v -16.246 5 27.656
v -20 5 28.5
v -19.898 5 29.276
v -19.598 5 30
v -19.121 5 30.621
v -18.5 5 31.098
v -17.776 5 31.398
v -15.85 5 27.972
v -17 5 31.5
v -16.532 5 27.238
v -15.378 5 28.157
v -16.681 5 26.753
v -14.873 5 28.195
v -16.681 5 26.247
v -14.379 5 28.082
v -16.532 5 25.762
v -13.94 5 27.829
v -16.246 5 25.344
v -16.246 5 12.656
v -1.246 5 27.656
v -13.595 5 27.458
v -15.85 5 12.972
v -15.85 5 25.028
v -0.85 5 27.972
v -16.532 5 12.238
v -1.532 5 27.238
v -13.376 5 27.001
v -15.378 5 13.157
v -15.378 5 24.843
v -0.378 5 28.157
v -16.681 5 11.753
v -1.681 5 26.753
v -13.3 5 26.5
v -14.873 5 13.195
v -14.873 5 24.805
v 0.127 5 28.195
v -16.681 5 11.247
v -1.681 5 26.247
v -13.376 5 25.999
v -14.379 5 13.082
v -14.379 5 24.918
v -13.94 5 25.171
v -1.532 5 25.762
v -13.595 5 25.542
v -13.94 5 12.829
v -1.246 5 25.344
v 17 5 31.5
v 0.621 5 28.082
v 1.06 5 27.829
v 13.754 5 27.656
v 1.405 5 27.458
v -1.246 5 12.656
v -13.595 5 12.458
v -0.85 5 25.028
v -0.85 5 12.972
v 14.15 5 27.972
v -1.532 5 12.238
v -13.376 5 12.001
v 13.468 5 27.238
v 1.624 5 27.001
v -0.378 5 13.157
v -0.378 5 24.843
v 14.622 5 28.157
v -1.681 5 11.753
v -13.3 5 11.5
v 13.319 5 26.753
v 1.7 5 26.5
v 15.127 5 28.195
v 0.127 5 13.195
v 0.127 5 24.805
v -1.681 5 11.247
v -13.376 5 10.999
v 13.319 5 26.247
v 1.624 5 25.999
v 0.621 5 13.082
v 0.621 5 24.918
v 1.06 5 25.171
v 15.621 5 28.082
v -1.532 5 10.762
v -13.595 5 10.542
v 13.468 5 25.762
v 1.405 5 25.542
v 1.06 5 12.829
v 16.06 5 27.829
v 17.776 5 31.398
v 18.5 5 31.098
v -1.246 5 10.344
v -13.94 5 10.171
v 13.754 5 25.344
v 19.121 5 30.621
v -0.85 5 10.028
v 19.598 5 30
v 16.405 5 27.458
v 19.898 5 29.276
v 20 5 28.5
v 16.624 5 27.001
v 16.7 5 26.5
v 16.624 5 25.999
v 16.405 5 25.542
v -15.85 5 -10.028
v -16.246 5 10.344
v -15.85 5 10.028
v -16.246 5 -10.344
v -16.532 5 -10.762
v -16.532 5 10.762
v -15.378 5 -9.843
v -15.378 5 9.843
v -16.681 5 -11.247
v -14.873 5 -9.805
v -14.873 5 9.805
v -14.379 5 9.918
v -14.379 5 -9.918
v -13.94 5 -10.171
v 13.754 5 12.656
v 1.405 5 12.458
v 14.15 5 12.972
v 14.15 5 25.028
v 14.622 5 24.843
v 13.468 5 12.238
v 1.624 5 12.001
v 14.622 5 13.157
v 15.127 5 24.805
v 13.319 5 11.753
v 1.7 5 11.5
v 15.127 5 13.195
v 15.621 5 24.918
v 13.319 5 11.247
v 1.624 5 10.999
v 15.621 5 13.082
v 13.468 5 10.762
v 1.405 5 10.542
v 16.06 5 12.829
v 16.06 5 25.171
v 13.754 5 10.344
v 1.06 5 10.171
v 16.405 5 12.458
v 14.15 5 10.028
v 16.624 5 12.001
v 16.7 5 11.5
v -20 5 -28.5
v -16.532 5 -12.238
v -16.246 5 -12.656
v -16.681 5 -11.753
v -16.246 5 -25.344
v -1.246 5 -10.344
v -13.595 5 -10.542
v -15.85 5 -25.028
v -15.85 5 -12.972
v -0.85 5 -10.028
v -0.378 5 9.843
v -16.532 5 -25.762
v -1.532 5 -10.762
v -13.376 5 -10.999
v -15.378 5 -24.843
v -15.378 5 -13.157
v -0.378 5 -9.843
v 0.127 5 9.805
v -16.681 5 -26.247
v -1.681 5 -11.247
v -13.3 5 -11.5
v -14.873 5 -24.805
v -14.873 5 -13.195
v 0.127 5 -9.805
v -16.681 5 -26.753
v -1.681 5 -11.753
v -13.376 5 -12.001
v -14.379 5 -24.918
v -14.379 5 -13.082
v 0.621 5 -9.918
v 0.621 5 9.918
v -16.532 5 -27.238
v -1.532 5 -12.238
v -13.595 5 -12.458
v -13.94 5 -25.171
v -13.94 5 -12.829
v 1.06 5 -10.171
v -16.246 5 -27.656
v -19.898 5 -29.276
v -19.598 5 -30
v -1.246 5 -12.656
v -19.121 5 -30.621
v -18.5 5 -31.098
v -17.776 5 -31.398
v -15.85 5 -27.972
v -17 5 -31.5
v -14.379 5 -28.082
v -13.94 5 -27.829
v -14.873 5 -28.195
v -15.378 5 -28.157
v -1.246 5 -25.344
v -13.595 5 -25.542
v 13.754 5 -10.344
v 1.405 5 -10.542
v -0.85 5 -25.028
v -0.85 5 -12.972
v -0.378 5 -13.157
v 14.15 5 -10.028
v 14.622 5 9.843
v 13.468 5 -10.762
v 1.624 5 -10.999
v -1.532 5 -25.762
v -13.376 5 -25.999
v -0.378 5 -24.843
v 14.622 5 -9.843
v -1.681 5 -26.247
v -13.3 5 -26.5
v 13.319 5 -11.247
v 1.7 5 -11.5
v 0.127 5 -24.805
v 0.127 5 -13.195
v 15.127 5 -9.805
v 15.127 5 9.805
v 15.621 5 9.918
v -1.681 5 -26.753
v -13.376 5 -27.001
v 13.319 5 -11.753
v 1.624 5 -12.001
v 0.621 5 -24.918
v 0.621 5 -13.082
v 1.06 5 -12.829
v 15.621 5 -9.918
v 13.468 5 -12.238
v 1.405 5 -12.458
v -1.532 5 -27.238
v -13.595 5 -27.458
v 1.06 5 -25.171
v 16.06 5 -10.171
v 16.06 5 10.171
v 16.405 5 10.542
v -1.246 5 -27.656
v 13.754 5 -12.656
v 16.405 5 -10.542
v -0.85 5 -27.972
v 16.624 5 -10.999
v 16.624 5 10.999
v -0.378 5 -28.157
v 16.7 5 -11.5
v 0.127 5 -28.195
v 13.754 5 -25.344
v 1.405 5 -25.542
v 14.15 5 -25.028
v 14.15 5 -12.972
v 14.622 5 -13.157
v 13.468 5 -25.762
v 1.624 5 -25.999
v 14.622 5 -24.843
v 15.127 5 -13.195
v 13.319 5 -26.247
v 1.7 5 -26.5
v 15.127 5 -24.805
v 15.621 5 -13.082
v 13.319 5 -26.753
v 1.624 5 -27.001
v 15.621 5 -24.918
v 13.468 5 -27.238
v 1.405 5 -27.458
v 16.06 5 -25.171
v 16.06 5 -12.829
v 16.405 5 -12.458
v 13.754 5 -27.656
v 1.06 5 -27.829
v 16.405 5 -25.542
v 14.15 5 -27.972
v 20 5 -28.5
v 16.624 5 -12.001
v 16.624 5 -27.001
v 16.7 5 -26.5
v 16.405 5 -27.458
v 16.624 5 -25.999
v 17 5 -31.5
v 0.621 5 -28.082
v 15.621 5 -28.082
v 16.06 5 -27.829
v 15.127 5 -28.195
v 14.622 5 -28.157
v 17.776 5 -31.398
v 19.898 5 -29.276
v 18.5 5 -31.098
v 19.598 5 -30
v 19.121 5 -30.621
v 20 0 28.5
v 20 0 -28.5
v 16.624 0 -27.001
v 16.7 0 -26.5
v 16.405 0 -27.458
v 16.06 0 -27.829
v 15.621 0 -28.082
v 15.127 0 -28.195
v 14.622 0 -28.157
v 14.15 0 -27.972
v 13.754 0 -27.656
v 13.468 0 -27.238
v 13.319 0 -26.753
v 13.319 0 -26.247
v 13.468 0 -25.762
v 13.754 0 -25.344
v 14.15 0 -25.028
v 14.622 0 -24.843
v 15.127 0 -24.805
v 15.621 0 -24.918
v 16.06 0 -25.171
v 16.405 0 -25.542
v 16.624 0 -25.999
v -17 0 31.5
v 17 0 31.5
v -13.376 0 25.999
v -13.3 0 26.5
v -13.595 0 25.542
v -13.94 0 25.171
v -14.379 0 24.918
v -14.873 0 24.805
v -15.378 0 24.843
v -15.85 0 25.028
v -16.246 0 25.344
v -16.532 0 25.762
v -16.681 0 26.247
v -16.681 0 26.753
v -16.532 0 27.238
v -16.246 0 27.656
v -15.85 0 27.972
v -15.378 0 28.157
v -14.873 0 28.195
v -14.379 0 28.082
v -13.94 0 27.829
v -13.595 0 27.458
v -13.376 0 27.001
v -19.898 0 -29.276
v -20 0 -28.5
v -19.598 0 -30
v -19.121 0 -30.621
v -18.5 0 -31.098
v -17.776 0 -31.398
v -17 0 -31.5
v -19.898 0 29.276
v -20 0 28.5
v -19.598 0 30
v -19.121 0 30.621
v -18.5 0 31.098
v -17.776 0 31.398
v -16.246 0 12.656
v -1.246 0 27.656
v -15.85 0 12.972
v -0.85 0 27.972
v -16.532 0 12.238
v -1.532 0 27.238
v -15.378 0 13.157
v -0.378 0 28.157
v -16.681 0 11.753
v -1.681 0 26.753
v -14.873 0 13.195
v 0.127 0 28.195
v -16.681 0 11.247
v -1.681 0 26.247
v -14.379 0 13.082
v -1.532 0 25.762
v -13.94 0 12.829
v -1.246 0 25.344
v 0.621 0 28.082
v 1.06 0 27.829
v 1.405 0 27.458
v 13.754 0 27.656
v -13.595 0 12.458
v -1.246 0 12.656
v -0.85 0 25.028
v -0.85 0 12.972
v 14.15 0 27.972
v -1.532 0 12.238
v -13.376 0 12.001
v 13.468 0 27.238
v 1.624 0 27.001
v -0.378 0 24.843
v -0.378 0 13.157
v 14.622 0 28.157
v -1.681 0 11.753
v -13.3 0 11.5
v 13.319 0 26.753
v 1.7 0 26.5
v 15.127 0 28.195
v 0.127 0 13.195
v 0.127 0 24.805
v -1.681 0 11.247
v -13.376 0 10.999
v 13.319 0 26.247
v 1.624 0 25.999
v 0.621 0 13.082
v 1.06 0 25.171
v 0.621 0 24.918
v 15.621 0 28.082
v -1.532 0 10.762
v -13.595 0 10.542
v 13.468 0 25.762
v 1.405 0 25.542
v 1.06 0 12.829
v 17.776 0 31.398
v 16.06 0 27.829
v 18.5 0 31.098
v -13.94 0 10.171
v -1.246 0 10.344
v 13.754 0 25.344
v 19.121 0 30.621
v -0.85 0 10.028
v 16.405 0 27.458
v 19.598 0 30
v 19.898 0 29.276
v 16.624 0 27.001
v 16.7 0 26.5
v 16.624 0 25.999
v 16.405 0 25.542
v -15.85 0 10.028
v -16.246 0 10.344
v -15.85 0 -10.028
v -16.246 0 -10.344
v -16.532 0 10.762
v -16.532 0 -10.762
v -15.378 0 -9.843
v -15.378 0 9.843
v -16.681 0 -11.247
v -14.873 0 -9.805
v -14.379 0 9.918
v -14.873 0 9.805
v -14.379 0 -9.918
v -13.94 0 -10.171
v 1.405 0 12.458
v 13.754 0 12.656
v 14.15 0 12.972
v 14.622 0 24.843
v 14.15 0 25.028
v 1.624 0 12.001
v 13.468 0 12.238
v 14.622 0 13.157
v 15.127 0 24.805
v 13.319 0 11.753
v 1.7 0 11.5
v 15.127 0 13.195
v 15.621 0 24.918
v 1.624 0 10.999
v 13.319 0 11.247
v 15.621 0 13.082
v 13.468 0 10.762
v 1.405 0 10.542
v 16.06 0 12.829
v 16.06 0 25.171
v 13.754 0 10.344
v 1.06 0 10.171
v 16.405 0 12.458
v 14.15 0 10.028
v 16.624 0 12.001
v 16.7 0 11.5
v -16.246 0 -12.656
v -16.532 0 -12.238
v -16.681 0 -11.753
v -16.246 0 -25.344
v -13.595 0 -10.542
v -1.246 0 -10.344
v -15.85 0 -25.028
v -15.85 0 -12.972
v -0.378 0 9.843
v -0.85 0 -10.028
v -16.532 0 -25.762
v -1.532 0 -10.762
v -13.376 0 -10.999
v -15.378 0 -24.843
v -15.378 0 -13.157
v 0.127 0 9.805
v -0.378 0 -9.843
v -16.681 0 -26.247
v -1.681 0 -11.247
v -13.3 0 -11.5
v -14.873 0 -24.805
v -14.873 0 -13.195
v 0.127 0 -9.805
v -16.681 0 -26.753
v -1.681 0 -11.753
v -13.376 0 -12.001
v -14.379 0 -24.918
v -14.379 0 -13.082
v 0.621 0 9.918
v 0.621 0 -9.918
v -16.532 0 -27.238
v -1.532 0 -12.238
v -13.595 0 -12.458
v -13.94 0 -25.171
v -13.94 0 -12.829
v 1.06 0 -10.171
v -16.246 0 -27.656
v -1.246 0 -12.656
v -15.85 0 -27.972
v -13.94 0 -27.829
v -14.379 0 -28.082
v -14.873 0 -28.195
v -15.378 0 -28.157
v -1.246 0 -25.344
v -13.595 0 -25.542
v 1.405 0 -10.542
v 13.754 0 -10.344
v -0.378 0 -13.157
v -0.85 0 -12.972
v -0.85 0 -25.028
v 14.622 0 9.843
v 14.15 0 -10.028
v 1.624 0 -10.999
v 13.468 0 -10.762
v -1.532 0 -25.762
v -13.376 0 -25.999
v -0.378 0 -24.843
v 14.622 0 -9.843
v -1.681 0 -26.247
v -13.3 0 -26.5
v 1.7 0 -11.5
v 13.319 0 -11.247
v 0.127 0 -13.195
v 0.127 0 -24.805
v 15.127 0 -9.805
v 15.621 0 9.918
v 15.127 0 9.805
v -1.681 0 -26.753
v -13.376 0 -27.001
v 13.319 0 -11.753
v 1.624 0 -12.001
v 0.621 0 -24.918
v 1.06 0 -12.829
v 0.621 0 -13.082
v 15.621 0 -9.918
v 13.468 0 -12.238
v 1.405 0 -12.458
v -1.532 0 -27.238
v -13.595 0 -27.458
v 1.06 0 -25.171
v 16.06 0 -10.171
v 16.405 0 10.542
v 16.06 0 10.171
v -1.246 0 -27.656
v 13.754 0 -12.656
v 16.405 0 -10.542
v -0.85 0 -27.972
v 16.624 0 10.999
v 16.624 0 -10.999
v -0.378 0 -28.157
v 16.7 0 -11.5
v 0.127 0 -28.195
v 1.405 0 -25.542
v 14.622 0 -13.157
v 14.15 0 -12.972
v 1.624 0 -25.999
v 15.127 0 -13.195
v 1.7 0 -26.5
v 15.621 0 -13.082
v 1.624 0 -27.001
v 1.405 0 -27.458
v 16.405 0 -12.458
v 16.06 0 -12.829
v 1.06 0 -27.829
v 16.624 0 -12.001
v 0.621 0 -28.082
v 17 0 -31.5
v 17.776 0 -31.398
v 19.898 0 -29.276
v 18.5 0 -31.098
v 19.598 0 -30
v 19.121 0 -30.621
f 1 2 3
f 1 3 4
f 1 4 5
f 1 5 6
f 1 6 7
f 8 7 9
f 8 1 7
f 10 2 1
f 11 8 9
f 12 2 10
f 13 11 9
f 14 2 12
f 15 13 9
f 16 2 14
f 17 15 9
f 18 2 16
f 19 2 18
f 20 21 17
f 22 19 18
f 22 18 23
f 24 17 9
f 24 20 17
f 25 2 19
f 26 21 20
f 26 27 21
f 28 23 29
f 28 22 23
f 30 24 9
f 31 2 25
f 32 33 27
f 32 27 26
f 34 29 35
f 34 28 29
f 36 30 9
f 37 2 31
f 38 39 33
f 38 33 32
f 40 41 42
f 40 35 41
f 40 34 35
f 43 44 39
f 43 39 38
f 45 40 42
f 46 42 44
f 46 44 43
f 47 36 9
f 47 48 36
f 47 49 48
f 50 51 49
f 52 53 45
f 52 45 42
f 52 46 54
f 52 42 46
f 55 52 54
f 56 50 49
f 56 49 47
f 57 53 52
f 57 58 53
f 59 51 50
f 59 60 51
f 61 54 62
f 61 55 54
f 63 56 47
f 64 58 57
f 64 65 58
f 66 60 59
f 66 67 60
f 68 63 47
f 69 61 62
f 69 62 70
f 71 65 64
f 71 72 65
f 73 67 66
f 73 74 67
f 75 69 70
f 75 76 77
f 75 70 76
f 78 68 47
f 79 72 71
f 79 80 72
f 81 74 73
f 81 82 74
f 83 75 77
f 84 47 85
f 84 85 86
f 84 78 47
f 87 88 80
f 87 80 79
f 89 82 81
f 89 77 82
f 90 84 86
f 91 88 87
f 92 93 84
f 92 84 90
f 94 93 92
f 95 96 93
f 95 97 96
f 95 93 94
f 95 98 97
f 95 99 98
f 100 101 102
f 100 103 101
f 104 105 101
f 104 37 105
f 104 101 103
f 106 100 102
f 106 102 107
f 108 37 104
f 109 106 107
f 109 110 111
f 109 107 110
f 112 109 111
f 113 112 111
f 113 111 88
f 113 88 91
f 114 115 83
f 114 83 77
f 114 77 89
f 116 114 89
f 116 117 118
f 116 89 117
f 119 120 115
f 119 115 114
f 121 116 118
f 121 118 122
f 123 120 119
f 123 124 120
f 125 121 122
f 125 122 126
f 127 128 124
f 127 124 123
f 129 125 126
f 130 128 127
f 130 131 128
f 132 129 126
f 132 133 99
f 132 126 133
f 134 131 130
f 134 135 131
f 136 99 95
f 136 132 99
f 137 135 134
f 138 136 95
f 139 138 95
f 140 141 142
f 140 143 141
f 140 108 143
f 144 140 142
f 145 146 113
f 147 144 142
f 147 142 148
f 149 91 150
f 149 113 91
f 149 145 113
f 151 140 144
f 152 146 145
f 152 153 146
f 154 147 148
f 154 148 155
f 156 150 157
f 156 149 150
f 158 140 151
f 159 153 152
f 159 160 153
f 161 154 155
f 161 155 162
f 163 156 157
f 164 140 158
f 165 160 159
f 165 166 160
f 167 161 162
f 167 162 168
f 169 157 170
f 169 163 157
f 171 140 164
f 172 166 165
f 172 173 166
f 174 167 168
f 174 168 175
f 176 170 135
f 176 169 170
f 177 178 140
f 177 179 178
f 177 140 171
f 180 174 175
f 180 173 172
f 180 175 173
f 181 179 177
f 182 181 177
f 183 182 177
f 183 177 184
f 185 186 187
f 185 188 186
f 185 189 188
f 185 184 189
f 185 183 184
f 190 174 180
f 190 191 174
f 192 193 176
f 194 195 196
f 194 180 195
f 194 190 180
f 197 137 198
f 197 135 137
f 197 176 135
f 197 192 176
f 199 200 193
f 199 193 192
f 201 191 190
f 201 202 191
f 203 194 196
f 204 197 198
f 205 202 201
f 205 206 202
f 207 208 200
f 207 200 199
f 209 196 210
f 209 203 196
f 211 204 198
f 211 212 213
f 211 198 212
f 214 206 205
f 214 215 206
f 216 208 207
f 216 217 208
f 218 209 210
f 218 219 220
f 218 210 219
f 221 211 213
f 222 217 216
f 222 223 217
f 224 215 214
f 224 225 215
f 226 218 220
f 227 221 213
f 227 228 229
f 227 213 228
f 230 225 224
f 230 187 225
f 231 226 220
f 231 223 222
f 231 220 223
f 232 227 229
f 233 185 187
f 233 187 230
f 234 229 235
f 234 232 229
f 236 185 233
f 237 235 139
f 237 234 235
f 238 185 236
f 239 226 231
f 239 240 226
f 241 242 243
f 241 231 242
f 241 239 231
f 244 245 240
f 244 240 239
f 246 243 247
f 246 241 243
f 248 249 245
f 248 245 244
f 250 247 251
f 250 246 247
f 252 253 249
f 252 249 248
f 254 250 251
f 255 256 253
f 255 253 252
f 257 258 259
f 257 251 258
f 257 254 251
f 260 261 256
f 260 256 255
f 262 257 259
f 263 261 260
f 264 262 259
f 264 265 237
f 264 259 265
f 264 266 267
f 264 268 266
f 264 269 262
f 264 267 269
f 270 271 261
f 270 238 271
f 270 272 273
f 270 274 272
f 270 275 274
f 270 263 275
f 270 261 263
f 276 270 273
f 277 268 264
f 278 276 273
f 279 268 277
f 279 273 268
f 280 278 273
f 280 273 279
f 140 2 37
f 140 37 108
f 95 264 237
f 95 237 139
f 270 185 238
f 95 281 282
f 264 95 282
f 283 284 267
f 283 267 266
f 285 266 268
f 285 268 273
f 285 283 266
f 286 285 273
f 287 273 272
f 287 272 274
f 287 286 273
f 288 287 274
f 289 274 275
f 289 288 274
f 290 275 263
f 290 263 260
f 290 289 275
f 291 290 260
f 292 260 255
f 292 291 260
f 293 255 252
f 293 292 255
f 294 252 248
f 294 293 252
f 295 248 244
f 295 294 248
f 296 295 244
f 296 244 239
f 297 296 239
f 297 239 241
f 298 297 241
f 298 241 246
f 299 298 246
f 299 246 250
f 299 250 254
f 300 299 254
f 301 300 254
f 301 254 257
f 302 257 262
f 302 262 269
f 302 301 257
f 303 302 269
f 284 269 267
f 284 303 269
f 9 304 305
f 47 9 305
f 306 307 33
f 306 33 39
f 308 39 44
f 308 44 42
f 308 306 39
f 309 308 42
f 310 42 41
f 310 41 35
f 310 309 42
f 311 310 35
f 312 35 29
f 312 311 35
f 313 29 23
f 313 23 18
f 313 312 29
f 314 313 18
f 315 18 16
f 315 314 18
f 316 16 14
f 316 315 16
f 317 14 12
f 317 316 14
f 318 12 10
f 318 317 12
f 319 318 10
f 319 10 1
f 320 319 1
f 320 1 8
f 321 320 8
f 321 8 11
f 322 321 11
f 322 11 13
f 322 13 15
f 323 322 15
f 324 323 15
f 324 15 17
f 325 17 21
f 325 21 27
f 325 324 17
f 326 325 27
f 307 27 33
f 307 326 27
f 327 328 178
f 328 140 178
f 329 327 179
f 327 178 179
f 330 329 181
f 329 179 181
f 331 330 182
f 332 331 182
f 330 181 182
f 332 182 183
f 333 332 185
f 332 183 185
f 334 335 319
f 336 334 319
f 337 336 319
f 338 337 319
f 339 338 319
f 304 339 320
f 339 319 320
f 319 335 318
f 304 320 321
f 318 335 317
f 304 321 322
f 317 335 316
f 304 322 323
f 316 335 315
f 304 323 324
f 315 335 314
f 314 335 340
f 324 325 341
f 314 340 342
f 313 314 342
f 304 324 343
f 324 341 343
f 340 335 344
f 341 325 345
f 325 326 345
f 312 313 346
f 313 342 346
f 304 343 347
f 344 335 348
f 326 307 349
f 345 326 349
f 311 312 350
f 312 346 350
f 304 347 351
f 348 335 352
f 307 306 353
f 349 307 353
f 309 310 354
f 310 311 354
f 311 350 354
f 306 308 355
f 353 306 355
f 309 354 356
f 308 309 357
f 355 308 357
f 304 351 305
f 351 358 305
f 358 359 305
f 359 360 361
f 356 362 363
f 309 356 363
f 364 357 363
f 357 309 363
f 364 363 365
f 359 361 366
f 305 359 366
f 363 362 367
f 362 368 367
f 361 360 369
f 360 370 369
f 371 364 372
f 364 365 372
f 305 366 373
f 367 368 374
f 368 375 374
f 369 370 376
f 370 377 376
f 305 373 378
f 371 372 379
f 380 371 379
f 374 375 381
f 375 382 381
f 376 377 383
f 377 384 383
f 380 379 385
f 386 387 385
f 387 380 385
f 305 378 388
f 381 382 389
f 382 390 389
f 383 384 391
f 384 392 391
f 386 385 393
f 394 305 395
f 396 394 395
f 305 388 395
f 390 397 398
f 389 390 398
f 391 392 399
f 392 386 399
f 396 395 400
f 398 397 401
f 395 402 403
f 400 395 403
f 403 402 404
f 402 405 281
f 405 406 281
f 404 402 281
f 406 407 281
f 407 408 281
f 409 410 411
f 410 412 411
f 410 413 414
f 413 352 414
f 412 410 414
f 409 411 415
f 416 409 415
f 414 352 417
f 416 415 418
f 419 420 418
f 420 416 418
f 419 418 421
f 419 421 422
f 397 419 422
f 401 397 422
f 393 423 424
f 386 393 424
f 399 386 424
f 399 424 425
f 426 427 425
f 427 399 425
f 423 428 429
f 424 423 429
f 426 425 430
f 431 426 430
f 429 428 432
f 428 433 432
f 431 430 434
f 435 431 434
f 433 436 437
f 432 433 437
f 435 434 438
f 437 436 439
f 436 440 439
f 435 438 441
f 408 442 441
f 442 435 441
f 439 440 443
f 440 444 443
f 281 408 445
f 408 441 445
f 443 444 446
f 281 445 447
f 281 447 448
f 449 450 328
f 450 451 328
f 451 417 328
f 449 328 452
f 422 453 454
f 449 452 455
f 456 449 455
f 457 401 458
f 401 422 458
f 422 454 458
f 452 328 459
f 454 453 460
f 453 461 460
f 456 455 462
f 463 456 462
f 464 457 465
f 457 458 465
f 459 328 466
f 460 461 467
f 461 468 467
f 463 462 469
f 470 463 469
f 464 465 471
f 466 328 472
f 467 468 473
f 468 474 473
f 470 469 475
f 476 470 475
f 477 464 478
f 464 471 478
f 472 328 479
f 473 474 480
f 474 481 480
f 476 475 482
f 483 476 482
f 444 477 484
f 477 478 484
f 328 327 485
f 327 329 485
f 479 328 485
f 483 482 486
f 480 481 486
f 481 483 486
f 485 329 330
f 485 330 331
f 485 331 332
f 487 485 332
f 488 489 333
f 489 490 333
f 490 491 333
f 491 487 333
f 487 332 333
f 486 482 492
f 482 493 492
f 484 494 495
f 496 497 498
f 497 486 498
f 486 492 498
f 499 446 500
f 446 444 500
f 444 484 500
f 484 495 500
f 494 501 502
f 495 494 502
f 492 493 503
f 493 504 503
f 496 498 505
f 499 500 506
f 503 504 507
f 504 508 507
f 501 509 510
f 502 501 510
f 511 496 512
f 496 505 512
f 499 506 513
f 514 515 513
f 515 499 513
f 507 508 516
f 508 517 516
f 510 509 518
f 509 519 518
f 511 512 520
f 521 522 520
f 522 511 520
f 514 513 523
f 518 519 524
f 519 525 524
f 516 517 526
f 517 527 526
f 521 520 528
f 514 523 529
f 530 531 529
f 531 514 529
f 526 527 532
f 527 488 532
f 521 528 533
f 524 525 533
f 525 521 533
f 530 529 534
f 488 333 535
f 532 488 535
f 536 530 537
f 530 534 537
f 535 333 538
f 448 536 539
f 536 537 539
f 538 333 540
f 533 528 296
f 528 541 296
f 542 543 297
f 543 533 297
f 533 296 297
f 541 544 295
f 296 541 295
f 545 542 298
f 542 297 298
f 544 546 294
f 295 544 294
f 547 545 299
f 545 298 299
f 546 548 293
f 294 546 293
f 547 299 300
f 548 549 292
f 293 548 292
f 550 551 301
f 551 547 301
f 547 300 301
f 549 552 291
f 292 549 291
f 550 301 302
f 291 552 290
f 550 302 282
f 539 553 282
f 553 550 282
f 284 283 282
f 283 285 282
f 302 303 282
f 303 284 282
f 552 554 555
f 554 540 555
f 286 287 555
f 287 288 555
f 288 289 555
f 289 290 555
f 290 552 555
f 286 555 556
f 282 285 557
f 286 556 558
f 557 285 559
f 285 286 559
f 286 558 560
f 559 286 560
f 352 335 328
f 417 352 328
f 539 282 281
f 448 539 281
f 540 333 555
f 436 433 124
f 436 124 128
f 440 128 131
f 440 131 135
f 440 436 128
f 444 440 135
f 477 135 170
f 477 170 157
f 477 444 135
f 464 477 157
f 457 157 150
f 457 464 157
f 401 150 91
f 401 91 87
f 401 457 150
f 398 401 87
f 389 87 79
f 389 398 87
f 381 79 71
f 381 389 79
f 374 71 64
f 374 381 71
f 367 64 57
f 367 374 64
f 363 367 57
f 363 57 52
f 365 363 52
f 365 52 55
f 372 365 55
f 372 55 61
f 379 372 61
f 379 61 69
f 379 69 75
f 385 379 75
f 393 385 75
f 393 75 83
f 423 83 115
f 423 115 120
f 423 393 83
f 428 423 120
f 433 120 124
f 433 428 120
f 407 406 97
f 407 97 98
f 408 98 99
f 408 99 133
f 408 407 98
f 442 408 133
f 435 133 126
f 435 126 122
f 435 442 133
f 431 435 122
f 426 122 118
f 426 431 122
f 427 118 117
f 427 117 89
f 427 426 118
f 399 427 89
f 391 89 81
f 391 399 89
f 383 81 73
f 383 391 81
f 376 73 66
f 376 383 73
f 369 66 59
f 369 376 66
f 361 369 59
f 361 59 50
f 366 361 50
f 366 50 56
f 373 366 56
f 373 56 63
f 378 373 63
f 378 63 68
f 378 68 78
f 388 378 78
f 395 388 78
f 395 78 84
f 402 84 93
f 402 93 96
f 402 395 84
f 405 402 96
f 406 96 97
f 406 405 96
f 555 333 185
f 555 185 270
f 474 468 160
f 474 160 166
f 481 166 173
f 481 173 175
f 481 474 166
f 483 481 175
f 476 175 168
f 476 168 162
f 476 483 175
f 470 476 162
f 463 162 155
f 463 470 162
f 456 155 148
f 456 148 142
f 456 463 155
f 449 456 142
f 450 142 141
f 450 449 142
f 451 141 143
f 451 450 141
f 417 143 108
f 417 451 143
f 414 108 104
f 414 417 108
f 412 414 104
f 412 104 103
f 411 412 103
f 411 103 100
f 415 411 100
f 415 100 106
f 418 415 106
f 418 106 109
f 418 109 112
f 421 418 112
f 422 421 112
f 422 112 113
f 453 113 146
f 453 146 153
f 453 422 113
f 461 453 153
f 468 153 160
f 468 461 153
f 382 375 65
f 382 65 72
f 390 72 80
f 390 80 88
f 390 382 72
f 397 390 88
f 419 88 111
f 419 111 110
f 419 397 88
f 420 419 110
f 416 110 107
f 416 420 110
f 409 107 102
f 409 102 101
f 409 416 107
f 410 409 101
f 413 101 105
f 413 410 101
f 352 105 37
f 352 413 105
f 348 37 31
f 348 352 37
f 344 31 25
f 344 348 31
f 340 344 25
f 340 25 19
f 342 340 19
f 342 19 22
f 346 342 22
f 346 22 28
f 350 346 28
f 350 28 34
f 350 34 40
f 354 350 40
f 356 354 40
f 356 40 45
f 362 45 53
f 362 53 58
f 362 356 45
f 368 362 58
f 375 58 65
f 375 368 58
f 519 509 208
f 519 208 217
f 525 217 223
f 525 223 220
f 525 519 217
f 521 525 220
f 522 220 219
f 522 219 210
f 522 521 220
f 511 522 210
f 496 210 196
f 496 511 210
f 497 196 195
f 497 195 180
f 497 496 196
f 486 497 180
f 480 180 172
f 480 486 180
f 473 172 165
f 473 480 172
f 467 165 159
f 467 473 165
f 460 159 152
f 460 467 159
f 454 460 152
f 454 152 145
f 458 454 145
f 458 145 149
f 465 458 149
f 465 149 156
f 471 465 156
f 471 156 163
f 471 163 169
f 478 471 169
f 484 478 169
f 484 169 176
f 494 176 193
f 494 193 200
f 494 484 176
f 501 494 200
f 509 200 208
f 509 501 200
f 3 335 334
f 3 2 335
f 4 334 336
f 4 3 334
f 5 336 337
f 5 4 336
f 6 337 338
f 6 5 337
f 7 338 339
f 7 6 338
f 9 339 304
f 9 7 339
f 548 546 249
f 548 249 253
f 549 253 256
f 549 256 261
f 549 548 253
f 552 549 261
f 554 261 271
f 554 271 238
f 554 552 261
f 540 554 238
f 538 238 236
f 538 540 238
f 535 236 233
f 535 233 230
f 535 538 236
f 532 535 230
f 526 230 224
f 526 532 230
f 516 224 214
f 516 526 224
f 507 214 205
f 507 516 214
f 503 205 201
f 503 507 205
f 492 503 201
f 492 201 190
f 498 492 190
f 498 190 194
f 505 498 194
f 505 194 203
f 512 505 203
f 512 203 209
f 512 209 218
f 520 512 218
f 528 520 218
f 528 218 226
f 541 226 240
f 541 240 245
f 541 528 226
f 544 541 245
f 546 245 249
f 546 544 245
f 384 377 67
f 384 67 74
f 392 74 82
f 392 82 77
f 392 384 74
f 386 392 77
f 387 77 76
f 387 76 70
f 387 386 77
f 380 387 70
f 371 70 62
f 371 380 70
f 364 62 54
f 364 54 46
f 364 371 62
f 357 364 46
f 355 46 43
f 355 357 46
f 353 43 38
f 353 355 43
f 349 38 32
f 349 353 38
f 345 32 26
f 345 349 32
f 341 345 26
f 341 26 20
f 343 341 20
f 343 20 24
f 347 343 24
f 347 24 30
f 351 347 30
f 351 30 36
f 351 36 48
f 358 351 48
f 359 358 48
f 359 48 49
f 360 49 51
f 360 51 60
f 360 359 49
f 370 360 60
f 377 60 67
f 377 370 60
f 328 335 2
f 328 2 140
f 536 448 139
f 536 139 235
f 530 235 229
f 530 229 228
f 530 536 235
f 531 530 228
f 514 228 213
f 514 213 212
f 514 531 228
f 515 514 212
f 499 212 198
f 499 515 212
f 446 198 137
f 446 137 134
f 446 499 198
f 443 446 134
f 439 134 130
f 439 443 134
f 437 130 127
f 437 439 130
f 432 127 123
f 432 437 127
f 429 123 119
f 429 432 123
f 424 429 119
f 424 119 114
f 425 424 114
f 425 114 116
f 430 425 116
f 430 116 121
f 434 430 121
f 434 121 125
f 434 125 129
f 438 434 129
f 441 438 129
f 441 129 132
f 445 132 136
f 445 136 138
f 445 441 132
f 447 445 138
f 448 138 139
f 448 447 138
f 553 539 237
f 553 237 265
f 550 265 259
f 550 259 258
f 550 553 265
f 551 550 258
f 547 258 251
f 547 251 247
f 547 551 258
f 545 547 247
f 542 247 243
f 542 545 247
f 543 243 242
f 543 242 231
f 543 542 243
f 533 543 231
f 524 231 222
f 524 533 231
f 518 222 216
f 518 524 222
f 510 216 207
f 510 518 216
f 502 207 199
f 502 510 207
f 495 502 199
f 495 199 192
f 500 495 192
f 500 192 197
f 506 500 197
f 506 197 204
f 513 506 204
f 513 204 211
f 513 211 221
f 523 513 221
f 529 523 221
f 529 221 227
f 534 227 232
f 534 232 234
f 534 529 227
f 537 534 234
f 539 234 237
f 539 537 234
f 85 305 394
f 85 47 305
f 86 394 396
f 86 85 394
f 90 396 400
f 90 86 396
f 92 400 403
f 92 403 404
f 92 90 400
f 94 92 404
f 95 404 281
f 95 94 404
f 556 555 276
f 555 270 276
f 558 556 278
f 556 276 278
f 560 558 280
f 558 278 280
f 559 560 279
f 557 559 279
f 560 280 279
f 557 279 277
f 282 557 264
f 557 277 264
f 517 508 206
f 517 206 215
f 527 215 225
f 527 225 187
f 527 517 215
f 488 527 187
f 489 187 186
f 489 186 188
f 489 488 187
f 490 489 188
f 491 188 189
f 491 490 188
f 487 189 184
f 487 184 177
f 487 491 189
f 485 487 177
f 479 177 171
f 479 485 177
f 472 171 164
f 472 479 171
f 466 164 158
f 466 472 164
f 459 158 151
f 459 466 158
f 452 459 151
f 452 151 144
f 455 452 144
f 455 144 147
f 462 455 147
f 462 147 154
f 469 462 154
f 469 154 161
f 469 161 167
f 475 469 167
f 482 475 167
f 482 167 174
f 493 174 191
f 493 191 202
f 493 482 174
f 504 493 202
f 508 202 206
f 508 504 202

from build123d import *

# Parameters (mm, degrees)
SKETCH_1_W      = 40
SKETCH_1_H      = 63
SKETCH_1_R      = 1.7
EXTRUDE_1_DEPTH = 5
FILLET_1_R      = 3


with BuildPart() as part:
    # ｽｹｯﾁ1 → ﾎﾞｽ - 押し出し1 (new body)
    with BuildSketch(Plane(origin=(0, 0, 0), x_dir=(1, 0, 0), z_dir=(0, 1, 0))):
        Rectangle(SKETCH_1_W, SKETCH_1_H)
        with Locations((-15, 26.5)):
            Circle(SKETCH_1_R, mode=Mode.SUBTRACT)
        with Locations((0, 26.5)):
            Circle(SKETCH_1_R, mode=Mode.SUBTRACT)
        with Locations((15, 26.5)):
            Circle(SKETCH_1_R, mode=Mode.SUBTRACT)
        with Locations((0, 11.5)):
            Circle(SKETCH_1_R, mode=Mode.SUBTRACT)
        with Locations((-15, 11.5)):
            Circle(SKETCH_1_R, mode=Mode.SUBTRACT)
        with Locations((15, 11.5)):
            Circle(SKETCH_1_R, mode=Mode.SUBTRACT)
        with Locations((-15, -11.5)):
            Circle(SKETCH_1_R, mode=Mode.SUBTRACT)
        with Locations((0, -11.5)):
            Circle(SKETCH_1_R, mode=Mode.SUBTRACT)
        with Locations((15, -11.5)):
            Circle(SKETCH_1_R, mode=Mode.SUBTRACT)
        with Locations((-15, -26.5)):
            Circle(SKETCH_1_R, mode=Mode.SUBTRACT)
        with Locations((0, -26.5)):
            Circle(SKETCH_1_R, mode=Mode.SUBTRACT)
        with Locations((15, -26.5)):
            Circle(SKETCH_1_R, mode=Mode.SUBTRACT)
    extrude(amount=EXTRUDE_1_DEPTH)

    # ﾌｨﾚｯﾄ1
    fillet_1_edges = [part.edges().sort_by_distance(p)[0] for p in [
        (20, 2.5, 31.5),
        (-20, 2.5, 31.5),
        (-20, 2.5, -31.5),
        (20, 2.5, -31.5),
    ]]
    fillet(fillet_1_edges, radius=FILLET_1_R)


solid = part.part
